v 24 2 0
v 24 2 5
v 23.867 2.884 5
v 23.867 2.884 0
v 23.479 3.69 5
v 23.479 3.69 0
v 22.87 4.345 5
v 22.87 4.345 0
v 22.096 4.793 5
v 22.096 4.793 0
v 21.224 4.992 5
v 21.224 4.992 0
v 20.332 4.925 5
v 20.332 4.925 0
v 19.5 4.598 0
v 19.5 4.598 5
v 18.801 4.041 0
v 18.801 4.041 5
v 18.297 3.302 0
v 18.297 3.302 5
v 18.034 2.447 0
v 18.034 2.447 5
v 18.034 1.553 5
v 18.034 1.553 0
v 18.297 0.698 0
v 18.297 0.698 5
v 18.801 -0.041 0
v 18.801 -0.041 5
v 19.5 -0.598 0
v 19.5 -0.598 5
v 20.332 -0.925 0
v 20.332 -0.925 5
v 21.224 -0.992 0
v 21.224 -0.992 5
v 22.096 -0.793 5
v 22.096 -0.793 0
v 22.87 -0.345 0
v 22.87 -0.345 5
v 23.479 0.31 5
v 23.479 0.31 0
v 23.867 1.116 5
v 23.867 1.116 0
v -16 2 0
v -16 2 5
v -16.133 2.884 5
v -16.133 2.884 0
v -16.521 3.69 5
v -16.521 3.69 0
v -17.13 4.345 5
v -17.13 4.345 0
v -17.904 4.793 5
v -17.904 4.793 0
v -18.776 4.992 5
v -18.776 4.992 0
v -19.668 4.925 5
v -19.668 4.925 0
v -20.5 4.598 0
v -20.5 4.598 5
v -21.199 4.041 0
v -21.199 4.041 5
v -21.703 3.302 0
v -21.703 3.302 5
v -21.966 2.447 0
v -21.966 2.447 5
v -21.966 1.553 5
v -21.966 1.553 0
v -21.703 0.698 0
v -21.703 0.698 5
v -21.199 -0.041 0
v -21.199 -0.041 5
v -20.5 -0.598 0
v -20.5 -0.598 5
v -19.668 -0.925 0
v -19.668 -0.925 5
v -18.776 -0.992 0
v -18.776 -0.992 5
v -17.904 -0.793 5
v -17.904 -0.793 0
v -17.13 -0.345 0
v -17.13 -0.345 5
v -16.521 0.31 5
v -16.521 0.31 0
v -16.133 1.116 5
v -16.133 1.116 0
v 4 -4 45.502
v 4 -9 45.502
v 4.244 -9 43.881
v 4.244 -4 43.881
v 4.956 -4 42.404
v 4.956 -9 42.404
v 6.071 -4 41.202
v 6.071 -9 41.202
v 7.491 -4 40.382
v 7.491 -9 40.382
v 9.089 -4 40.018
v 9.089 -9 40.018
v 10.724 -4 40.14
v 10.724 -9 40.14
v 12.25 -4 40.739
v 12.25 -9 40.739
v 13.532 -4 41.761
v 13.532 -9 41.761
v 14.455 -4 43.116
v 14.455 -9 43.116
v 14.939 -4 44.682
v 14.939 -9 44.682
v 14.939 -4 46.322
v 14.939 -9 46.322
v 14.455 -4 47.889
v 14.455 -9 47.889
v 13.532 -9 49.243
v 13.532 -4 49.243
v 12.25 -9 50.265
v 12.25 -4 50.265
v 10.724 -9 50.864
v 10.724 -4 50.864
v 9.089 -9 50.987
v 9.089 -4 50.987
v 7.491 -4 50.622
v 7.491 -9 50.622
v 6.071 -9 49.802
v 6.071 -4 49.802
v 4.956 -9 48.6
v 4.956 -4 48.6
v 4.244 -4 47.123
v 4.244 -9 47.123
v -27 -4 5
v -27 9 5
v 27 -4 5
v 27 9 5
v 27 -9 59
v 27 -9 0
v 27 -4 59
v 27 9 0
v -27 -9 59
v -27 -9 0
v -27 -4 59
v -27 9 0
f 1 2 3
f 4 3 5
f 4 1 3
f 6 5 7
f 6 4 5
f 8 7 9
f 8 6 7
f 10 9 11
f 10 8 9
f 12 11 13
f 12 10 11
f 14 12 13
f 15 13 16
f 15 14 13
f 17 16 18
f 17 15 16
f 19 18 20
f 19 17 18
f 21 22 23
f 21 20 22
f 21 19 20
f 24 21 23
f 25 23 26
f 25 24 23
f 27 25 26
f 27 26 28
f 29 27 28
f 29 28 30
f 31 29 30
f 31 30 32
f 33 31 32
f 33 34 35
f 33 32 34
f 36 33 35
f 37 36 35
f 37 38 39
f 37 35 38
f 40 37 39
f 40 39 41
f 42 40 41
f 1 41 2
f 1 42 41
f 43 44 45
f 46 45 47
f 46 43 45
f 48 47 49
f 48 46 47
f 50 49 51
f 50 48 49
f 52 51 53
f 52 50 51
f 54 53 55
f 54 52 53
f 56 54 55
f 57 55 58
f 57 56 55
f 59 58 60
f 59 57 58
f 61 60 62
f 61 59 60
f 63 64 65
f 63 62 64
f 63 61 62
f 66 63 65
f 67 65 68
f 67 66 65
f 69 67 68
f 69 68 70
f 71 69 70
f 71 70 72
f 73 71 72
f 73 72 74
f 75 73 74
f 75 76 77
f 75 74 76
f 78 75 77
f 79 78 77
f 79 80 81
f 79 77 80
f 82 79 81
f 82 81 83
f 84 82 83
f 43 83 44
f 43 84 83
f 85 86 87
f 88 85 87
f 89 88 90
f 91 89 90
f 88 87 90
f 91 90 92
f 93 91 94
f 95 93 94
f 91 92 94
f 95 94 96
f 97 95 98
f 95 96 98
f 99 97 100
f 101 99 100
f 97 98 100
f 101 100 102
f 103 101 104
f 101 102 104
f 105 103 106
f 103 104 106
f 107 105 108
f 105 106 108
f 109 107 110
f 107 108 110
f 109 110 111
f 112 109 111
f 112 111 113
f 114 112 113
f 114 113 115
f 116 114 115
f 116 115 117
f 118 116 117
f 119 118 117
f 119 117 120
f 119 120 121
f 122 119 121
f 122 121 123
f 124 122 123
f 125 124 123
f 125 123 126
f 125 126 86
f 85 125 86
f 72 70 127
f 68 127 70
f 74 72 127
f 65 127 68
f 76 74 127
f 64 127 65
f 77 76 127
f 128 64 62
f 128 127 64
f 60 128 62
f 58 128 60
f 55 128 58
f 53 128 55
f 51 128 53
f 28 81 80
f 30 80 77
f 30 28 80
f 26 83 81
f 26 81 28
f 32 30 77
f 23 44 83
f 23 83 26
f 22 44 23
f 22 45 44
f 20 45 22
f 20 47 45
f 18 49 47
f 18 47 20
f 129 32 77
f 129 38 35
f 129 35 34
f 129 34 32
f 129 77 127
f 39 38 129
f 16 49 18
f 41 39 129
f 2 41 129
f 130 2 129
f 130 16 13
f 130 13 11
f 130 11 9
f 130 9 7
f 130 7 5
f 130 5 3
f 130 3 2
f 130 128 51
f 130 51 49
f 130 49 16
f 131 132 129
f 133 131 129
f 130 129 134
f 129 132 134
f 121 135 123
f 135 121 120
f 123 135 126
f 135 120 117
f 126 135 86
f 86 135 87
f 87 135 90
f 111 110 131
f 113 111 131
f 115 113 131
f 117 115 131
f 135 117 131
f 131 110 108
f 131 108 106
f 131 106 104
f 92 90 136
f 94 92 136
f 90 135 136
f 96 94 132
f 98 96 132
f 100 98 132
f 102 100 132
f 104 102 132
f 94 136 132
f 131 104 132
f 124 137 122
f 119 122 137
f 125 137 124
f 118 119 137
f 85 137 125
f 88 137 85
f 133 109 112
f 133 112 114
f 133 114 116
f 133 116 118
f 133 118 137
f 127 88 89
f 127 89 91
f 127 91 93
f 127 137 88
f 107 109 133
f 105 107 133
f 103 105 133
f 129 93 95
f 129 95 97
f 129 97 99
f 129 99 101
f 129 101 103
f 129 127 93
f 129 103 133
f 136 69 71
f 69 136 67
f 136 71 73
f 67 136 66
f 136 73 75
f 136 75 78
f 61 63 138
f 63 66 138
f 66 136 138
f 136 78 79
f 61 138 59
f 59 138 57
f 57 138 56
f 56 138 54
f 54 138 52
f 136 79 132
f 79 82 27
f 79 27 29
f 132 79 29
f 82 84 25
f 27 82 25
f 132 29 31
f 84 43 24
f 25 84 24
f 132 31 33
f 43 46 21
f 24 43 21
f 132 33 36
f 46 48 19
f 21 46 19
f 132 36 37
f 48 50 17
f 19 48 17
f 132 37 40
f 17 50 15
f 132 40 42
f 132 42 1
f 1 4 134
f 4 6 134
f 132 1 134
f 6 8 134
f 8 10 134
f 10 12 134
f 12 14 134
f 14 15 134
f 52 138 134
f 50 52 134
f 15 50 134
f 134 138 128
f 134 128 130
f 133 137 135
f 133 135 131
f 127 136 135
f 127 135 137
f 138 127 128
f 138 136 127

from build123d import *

# Parameters (mm, degrees)
ESQUISSE1_W             = 54
ESQUISSE1_H             = 18
ESQUISSE1_R             = 3
BOSS_EXTRU_1_DEPTH      = 59
ESQUISSE2_W             = 89.885876072
ESQUISSE2_H             = 74.564815434
ENL_V_MAT_EXTRU_1_DEPTH = 13
D_GAGEMENT_M101_D       = 11


with BuildPart() as part:
    # Esquisse1 → Boss.-Extru.1 (new body)
    with BuildSketch(Plane.XY):
        Rectangle(ESQUISSE1_W, ESQUISSE1_H)
        with Locations((-19, 2)):
            Circle(ESQUISSE1_R, mode=Mode.SUBTRACT)
        with Locations((21, 2)):
            Circle(ESQUISSE1_R, mode=Mode.SUBTRACT)
    extrude(amount=BOSS_EXTRU_1_DEPTH)

    # Esquisse2 → Enlèv. mat.-Extru.1 (cut)
    with BuildSketch(Plane(origin=(0, 9, 0), x_dir=(1, 0, 0), z_dir=(0, 1, 0))):
        with Locations((-2.437014962, -42.282407717)):
            Rectangle(ESQUISSE2_W, ESQUISSE2_H)
    extrude(amount=-ENL_V_MAT_EXTRU_1_DEPTH, mode=Mode.SUBTRACT)

    # Dégagement M101 (through all)
    with Locations(Plane(origin=(0, -4, 0), x_dir=(1, 0, 0), z_dir=(0, 1, 0))):
        with Locations((9.500000001, -45.5022105)):
            Hole(D_GAGEMENT_M101_D / 2)


solid = part.part
